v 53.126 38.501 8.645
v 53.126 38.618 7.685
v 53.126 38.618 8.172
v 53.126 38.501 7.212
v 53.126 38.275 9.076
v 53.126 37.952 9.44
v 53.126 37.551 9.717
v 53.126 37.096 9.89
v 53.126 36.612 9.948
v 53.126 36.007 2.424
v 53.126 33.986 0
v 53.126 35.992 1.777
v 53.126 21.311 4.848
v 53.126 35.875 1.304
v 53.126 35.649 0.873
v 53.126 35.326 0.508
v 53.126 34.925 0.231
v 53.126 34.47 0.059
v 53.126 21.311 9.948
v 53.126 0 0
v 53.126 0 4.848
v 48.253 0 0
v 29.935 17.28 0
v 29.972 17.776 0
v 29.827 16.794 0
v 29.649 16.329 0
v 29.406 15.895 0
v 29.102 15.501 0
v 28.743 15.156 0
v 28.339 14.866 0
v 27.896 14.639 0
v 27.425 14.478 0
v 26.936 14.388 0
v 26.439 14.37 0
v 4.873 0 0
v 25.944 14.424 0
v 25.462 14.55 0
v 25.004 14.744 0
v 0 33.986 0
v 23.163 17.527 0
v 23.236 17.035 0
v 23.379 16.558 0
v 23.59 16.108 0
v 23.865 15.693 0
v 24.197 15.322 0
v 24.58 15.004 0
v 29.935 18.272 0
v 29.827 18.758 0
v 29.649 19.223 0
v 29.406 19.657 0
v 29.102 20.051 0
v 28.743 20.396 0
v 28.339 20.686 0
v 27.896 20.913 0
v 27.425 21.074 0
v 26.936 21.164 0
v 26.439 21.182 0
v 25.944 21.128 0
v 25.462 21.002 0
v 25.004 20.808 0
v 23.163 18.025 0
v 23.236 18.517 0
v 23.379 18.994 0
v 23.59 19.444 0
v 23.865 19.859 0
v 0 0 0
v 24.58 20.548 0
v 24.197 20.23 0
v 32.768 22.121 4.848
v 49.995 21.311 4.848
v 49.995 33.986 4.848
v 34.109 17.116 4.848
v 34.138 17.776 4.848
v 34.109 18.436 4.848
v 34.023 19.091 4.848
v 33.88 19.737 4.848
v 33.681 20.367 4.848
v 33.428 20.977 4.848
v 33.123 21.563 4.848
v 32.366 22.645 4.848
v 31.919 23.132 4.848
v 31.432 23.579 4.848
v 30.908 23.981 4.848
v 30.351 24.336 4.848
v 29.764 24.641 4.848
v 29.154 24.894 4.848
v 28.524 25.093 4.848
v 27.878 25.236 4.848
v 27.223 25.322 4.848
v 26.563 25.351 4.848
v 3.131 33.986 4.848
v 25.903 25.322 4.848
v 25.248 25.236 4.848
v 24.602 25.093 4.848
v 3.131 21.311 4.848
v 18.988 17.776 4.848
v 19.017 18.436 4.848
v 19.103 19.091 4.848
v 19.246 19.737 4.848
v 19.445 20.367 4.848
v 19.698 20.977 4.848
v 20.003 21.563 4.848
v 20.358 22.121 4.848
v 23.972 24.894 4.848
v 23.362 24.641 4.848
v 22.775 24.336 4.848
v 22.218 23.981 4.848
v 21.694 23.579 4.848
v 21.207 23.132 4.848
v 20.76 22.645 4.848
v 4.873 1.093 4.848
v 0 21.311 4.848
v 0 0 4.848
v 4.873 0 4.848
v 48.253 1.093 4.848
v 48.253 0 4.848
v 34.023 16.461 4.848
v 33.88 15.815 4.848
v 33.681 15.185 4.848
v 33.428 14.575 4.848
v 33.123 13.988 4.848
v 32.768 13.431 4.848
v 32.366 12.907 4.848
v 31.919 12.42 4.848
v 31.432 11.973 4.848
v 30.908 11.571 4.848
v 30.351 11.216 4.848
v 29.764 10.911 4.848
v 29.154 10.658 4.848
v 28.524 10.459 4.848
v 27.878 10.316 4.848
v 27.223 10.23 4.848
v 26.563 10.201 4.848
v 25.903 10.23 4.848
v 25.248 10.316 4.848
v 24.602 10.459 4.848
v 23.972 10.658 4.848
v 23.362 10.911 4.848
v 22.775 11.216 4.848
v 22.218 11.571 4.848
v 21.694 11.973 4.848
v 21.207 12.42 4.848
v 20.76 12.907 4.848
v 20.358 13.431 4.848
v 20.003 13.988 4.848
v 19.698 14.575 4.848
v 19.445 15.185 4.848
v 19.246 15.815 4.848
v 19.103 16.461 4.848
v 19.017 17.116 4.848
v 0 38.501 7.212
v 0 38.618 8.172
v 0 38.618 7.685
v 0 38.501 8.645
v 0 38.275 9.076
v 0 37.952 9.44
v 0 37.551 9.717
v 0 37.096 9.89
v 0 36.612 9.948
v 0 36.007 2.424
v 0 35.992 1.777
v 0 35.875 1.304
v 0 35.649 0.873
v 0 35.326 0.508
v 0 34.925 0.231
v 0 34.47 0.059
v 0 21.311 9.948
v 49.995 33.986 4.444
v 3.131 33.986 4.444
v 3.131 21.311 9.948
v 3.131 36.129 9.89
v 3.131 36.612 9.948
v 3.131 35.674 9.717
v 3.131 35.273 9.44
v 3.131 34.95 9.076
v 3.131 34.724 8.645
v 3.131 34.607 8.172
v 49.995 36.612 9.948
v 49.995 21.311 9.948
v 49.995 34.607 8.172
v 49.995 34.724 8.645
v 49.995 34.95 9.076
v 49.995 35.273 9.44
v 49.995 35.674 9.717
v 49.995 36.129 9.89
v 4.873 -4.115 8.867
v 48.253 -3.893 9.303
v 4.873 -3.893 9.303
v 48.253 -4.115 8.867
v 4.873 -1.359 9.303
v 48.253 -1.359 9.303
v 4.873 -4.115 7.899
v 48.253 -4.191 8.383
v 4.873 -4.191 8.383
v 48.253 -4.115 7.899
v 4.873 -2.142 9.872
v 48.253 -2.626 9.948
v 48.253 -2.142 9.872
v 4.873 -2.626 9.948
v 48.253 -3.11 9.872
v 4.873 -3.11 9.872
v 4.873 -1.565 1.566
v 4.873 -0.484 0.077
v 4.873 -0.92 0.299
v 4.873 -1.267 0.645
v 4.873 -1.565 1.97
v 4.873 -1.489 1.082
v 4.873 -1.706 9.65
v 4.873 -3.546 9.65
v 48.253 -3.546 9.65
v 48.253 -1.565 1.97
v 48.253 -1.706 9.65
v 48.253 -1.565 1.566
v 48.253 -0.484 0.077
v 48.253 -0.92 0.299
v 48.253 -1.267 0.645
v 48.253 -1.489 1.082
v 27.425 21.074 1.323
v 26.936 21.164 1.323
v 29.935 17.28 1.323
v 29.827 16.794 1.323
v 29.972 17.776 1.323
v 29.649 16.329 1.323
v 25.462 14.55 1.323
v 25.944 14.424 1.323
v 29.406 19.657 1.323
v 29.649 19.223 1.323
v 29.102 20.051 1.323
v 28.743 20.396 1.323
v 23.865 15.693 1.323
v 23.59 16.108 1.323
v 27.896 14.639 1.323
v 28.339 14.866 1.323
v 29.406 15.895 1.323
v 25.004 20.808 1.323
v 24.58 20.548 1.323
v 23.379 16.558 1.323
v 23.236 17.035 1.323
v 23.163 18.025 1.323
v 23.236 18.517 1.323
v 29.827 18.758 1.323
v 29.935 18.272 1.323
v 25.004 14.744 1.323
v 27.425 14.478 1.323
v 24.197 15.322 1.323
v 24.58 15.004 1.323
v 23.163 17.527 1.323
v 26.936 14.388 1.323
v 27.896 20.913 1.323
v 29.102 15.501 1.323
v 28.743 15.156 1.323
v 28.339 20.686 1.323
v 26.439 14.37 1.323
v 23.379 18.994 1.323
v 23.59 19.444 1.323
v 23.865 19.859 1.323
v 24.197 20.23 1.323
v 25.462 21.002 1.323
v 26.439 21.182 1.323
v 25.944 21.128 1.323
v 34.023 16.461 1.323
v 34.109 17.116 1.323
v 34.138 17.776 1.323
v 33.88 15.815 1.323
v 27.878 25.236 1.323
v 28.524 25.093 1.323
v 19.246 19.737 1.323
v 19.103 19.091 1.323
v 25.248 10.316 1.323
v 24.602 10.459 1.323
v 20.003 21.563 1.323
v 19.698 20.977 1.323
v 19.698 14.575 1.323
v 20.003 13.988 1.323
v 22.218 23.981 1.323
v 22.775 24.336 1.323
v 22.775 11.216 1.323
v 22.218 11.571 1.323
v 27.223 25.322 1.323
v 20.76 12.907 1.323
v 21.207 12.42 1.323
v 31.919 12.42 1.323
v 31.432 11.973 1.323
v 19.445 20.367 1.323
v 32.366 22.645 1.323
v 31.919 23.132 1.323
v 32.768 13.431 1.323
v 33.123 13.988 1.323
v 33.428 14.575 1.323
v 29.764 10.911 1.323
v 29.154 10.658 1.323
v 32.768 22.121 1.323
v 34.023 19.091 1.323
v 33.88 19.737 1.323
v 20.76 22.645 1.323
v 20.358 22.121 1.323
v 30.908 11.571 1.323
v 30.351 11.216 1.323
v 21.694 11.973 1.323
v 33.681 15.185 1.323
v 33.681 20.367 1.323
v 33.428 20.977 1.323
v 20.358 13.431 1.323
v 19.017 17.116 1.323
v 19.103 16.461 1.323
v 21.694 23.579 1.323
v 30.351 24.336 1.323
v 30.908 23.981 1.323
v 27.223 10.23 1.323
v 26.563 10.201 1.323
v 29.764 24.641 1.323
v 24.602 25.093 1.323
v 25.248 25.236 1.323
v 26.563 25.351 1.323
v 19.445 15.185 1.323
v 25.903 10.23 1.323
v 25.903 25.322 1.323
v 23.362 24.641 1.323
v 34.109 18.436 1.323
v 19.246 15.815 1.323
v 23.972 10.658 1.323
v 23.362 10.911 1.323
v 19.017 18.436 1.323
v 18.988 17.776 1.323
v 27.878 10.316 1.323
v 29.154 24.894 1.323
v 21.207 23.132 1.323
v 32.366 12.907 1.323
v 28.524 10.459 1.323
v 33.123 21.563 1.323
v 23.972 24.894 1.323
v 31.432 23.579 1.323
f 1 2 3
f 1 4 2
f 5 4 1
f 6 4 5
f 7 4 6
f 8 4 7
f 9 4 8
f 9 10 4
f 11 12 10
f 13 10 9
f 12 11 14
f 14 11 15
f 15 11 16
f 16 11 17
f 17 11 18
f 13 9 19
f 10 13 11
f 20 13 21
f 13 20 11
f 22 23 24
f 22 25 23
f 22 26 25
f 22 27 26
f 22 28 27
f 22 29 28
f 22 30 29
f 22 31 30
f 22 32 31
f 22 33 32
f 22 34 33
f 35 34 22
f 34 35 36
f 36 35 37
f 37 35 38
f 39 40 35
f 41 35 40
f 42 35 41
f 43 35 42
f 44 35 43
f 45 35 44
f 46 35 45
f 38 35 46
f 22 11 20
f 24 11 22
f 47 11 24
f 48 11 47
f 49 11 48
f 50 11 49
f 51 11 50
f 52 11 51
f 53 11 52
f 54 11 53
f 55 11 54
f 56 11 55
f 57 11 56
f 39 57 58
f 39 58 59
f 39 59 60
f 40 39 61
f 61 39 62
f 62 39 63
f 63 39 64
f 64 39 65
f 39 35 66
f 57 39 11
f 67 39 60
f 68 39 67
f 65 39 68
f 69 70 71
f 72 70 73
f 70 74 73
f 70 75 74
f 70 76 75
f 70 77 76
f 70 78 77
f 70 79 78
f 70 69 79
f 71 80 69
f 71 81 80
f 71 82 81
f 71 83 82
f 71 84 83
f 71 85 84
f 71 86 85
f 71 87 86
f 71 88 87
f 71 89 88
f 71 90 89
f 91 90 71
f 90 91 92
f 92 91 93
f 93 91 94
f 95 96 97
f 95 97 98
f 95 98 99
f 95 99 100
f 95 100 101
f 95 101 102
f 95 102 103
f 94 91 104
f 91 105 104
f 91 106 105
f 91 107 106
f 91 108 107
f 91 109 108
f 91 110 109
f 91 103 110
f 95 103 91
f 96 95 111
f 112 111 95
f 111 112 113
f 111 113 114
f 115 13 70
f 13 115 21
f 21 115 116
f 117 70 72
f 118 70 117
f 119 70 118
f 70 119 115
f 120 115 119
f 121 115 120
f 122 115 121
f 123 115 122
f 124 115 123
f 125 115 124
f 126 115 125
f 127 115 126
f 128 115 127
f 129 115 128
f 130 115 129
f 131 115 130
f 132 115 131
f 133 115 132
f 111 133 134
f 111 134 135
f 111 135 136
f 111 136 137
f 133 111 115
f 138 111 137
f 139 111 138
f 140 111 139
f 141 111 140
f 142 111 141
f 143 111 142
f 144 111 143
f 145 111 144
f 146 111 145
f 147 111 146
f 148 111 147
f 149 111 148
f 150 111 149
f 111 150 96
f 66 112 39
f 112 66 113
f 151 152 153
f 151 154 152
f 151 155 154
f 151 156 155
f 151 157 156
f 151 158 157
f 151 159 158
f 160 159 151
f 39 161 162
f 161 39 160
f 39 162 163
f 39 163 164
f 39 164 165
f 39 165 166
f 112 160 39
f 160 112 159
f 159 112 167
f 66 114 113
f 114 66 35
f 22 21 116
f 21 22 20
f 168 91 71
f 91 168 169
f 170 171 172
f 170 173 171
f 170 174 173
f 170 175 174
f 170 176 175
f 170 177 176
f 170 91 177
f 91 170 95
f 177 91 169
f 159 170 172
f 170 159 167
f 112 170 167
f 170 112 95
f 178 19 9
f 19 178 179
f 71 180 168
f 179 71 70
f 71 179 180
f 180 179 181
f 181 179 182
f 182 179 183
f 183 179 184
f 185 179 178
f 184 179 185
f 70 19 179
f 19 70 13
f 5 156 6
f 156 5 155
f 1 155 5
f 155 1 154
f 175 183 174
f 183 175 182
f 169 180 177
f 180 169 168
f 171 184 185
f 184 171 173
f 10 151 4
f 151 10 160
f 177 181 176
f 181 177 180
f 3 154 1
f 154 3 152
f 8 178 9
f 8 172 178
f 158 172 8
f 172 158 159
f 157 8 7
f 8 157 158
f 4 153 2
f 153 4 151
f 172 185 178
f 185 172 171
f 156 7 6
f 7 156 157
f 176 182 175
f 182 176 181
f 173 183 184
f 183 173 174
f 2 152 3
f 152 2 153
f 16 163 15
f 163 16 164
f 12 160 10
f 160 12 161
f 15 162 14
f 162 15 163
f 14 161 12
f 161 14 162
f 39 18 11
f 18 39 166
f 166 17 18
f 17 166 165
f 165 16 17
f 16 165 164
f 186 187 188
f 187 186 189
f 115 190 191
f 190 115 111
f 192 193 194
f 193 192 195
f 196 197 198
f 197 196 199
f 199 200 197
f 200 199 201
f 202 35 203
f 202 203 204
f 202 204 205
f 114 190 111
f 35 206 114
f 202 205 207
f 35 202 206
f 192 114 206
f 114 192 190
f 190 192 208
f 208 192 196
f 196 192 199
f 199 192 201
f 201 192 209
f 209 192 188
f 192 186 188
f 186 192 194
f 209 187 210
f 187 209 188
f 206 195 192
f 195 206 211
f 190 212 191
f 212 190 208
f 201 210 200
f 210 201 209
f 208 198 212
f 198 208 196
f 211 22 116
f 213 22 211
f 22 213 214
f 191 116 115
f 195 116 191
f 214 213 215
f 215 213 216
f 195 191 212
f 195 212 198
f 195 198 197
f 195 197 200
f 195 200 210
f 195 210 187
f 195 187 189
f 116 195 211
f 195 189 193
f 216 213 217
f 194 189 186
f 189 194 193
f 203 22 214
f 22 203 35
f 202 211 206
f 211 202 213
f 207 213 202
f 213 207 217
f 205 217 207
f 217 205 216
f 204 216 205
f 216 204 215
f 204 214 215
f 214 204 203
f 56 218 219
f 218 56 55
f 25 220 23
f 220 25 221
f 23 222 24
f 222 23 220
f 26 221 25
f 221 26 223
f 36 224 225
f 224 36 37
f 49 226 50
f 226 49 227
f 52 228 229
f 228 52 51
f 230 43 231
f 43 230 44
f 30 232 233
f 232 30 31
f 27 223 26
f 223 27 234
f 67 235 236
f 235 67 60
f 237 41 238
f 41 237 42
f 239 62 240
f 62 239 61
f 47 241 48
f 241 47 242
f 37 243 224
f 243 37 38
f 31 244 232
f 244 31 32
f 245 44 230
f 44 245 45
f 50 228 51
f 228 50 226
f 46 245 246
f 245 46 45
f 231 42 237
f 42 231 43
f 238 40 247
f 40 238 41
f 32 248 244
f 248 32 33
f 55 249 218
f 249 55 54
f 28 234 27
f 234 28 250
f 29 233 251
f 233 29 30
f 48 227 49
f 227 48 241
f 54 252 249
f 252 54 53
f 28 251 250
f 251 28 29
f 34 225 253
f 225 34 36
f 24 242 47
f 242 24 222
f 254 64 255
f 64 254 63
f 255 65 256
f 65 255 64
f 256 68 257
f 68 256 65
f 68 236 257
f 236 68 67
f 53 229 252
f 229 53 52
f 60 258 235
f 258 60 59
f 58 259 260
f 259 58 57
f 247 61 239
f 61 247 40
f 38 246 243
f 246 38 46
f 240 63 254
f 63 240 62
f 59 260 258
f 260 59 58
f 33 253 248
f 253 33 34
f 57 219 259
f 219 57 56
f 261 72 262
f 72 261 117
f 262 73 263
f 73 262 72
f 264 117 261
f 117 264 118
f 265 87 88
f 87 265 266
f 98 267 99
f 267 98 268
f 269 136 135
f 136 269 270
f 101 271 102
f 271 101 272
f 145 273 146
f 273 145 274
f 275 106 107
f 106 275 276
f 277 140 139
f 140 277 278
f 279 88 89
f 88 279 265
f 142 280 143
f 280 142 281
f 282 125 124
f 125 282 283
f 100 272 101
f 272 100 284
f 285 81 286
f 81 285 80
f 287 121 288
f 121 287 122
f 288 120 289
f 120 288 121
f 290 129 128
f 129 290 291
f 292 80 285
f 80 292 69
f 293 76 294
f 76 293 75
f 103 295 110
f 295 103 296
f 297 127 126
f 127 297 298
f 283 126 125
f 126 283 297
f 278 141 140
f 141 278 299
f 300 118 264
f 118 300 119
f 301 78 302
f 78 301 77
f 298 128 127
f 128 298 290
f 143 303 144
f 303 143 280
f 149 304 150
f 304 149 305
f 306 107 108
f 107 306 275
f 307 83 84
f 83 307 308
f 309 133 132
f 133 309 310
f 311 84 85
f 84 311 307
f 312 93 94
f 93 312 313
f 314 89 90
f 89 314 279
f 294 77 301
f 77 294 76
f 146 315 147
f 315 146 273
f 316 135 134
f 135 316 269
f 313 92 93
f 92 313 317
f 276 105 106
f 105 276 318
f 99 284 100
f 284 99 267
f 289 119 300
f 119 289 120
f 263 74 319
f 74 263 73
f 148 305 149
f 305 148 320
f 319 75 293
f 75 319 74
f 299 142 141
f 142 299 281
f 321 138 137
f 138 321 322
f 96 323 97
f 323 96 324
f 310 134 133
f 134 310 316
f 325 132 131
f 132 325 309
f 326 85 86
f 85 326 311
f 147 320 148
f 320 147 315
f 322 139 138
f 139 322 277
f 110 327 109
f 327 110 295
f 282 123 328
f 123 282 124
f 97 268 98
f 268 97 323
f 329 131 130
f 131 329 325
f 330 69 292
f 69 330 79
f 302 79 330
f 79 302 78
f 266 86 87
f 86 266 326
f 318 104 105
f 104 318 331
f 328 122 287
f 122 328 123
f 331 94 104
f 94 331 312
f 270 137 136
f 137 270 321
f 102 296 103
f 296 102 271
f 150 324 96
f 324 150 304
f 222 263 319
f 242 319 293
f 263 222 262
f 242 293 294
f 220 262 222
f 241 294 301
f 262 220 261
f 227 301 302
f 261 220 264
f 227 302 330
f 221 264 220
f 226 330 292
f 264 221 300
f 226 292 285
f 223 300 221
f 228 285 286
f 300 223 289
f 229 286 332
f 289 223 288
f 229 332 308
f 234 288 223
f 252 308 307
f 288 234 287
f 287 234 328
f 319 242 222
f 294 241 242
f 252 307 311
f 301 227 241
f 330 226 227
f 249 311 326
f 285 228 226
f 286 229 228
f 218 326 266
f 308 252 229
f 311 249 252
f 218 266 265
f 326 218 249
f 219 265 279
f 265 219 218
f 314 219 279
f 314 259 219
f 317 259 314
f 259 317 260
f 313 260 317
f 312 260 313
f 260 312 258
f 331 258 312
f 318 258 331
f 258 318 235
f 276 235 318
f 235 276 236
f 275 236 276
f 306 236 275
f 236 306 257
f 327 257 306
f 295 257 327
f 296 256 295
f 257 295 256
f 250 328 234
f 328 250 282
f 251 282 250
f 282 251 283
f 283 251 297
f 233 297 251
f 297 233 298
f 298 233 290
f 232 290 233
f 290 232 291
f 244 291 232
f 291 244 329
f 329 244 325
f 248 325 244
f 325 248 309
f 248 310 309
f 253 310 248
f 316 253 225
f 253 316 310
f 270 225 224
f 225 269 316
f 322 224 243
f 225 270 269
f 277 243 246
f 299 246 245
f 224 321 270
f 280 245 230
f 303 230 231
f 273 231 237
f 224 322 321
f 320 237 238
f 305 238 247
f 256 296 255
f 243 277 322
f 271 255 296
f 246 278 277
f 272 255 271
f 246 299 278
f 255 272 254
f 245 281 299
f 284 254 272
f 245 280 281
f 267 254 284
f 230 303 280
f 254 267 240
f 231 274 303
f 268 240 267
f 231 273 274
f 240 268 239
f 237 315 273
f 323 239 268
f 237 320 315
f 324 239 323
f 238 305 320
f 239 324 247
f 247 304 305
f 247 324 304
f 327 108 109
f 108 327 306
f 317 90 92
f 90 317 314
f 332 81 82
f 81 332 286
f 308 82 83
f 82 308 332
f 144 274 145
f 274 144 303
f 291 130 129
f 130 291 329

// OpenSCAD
// https://www.thingiverse.com/thing:2943710/
// modified by antocuni to use a PH14 hole

$fa=5; // default minimum facet angle is now 0.5°
$fs=0.5; // default minimum facet size is now 0.5 mm

//top plate
tpx = 52.6;
tpy = 47.6-5.2;
tpz = 6.3-1.5;

//base plate;
bpx = tpx;
bpy = tpy-5.2;// 42.4;
bpz = 9.85;

//front lip
flx = 42.95;
fly = 4.2;
flz = 5.1;
fd = 3.1;
flo = 2.4;

//back lip
blx = tpx;
bly = 16.7;
blz = bpz - tpz;

//backlip diameter
bd = 4;

//back lip z offset from top
blo = 2.4;

*union()
{
  cube([tpx,tpy,tpz]);
  translate([0,-(bpy-tpy)/2,0])
  cube([bpx,bpy,bpz]);
}

scale([1.01, 1.01, 1.01]) {
difference()
{
  translate([0,tpy-((tpy-bpy)/2)-fd/2,bpz])
    rotate([180,0,0])
      plate();
  
  translate([0,-1,0])
  {
    translate([bpx/2,bpy/2,0])
      r_screwhole();

    /* translate([bpx/2-15,bpy/2-10,0]) r_screwhole(); */
    /* translate([bpx/2-15,bpy/2+10,0]) r_screwhole(); */
    /* translate([bpx/2+15,bpy/2+10,0]) r_screwhole(); */
    /* translate([bpx/2+15,bpy/2-10,0]) r_screwhole(); */
  }
}
}

module plate()
{
  translate([0,(tpy-bpy)/2+bd/2,bpz-tpz])
    cube([bpx,bpy-fd/2-bd/2,tpz]);

  translate([0,bd/2,0])
    cube([fd,bly-fd/2,6]);

  translate([tpx-fd,bd/2,0])
    cube([fd,bly-fd/2,6]);

  hull()
  {
    translate([0,bd/2,bd/2])
      rotate([0,90,0])
        cylinder(d=bd,h=blx);

    translate([0,(tpy-bpy)/2,bpz-blo-bd/2])
      cube([blx,bd/2,bd/2]);
  }

  hull()
  {
    translate([0,(tpy-bpy)/2,bpz-blo-bd/2])
      cube([blx,bd/2,bd/2]);

    translate([0,bd/2+(tpy-bpy)/2,bpz-bd/2])
      rotate([0,90,0])
        cylinder(d=bd,h=blx);
  }

  hull()
  {
    translate([(blx-flx)/2,tpy-fd/2,fd/2])
      rotate([0,90,0])
        cylinder(d=fd,h=flx);

    translate([(blx-flx)/2,tpy-fd-(tpy-bpy)/2,bpz-fd/2-flo])
      cube([flx,fd,bd/2]);  
  }

  hull()
  {
    translate([(blx-flx)/2,tpy-fd-(tpy-bpy)/2,bpz-fd/2-flo])
      cube([flx,fd,bd/2]);

    translate([(blx-flx)/2,tpy-fd/2-(tpy-bpy)/2,bpz-fd/2])
      rotate([0,90,0])
        cylinder(d=fd,h=flx);
  }
}

module r_screwhole()
{
  translate([0,0,tpz])
    rotate([180,0,0])
      screwhole(tpz);
}

module screwhole(wz,hz=3.5)
{
  /* M3 = 3.4; */
  /* M3h = 6; */

  PH14 = 6.35 + 0.4;  // photographic 1/4" bolt ==> 6.35 mm
  PH14h = 15;

  
  cylinder(d=PH14,h=wz+1);
  
  translate([0,0,-0.01])
    cylinder(d=PH14h,h=hz);
}
